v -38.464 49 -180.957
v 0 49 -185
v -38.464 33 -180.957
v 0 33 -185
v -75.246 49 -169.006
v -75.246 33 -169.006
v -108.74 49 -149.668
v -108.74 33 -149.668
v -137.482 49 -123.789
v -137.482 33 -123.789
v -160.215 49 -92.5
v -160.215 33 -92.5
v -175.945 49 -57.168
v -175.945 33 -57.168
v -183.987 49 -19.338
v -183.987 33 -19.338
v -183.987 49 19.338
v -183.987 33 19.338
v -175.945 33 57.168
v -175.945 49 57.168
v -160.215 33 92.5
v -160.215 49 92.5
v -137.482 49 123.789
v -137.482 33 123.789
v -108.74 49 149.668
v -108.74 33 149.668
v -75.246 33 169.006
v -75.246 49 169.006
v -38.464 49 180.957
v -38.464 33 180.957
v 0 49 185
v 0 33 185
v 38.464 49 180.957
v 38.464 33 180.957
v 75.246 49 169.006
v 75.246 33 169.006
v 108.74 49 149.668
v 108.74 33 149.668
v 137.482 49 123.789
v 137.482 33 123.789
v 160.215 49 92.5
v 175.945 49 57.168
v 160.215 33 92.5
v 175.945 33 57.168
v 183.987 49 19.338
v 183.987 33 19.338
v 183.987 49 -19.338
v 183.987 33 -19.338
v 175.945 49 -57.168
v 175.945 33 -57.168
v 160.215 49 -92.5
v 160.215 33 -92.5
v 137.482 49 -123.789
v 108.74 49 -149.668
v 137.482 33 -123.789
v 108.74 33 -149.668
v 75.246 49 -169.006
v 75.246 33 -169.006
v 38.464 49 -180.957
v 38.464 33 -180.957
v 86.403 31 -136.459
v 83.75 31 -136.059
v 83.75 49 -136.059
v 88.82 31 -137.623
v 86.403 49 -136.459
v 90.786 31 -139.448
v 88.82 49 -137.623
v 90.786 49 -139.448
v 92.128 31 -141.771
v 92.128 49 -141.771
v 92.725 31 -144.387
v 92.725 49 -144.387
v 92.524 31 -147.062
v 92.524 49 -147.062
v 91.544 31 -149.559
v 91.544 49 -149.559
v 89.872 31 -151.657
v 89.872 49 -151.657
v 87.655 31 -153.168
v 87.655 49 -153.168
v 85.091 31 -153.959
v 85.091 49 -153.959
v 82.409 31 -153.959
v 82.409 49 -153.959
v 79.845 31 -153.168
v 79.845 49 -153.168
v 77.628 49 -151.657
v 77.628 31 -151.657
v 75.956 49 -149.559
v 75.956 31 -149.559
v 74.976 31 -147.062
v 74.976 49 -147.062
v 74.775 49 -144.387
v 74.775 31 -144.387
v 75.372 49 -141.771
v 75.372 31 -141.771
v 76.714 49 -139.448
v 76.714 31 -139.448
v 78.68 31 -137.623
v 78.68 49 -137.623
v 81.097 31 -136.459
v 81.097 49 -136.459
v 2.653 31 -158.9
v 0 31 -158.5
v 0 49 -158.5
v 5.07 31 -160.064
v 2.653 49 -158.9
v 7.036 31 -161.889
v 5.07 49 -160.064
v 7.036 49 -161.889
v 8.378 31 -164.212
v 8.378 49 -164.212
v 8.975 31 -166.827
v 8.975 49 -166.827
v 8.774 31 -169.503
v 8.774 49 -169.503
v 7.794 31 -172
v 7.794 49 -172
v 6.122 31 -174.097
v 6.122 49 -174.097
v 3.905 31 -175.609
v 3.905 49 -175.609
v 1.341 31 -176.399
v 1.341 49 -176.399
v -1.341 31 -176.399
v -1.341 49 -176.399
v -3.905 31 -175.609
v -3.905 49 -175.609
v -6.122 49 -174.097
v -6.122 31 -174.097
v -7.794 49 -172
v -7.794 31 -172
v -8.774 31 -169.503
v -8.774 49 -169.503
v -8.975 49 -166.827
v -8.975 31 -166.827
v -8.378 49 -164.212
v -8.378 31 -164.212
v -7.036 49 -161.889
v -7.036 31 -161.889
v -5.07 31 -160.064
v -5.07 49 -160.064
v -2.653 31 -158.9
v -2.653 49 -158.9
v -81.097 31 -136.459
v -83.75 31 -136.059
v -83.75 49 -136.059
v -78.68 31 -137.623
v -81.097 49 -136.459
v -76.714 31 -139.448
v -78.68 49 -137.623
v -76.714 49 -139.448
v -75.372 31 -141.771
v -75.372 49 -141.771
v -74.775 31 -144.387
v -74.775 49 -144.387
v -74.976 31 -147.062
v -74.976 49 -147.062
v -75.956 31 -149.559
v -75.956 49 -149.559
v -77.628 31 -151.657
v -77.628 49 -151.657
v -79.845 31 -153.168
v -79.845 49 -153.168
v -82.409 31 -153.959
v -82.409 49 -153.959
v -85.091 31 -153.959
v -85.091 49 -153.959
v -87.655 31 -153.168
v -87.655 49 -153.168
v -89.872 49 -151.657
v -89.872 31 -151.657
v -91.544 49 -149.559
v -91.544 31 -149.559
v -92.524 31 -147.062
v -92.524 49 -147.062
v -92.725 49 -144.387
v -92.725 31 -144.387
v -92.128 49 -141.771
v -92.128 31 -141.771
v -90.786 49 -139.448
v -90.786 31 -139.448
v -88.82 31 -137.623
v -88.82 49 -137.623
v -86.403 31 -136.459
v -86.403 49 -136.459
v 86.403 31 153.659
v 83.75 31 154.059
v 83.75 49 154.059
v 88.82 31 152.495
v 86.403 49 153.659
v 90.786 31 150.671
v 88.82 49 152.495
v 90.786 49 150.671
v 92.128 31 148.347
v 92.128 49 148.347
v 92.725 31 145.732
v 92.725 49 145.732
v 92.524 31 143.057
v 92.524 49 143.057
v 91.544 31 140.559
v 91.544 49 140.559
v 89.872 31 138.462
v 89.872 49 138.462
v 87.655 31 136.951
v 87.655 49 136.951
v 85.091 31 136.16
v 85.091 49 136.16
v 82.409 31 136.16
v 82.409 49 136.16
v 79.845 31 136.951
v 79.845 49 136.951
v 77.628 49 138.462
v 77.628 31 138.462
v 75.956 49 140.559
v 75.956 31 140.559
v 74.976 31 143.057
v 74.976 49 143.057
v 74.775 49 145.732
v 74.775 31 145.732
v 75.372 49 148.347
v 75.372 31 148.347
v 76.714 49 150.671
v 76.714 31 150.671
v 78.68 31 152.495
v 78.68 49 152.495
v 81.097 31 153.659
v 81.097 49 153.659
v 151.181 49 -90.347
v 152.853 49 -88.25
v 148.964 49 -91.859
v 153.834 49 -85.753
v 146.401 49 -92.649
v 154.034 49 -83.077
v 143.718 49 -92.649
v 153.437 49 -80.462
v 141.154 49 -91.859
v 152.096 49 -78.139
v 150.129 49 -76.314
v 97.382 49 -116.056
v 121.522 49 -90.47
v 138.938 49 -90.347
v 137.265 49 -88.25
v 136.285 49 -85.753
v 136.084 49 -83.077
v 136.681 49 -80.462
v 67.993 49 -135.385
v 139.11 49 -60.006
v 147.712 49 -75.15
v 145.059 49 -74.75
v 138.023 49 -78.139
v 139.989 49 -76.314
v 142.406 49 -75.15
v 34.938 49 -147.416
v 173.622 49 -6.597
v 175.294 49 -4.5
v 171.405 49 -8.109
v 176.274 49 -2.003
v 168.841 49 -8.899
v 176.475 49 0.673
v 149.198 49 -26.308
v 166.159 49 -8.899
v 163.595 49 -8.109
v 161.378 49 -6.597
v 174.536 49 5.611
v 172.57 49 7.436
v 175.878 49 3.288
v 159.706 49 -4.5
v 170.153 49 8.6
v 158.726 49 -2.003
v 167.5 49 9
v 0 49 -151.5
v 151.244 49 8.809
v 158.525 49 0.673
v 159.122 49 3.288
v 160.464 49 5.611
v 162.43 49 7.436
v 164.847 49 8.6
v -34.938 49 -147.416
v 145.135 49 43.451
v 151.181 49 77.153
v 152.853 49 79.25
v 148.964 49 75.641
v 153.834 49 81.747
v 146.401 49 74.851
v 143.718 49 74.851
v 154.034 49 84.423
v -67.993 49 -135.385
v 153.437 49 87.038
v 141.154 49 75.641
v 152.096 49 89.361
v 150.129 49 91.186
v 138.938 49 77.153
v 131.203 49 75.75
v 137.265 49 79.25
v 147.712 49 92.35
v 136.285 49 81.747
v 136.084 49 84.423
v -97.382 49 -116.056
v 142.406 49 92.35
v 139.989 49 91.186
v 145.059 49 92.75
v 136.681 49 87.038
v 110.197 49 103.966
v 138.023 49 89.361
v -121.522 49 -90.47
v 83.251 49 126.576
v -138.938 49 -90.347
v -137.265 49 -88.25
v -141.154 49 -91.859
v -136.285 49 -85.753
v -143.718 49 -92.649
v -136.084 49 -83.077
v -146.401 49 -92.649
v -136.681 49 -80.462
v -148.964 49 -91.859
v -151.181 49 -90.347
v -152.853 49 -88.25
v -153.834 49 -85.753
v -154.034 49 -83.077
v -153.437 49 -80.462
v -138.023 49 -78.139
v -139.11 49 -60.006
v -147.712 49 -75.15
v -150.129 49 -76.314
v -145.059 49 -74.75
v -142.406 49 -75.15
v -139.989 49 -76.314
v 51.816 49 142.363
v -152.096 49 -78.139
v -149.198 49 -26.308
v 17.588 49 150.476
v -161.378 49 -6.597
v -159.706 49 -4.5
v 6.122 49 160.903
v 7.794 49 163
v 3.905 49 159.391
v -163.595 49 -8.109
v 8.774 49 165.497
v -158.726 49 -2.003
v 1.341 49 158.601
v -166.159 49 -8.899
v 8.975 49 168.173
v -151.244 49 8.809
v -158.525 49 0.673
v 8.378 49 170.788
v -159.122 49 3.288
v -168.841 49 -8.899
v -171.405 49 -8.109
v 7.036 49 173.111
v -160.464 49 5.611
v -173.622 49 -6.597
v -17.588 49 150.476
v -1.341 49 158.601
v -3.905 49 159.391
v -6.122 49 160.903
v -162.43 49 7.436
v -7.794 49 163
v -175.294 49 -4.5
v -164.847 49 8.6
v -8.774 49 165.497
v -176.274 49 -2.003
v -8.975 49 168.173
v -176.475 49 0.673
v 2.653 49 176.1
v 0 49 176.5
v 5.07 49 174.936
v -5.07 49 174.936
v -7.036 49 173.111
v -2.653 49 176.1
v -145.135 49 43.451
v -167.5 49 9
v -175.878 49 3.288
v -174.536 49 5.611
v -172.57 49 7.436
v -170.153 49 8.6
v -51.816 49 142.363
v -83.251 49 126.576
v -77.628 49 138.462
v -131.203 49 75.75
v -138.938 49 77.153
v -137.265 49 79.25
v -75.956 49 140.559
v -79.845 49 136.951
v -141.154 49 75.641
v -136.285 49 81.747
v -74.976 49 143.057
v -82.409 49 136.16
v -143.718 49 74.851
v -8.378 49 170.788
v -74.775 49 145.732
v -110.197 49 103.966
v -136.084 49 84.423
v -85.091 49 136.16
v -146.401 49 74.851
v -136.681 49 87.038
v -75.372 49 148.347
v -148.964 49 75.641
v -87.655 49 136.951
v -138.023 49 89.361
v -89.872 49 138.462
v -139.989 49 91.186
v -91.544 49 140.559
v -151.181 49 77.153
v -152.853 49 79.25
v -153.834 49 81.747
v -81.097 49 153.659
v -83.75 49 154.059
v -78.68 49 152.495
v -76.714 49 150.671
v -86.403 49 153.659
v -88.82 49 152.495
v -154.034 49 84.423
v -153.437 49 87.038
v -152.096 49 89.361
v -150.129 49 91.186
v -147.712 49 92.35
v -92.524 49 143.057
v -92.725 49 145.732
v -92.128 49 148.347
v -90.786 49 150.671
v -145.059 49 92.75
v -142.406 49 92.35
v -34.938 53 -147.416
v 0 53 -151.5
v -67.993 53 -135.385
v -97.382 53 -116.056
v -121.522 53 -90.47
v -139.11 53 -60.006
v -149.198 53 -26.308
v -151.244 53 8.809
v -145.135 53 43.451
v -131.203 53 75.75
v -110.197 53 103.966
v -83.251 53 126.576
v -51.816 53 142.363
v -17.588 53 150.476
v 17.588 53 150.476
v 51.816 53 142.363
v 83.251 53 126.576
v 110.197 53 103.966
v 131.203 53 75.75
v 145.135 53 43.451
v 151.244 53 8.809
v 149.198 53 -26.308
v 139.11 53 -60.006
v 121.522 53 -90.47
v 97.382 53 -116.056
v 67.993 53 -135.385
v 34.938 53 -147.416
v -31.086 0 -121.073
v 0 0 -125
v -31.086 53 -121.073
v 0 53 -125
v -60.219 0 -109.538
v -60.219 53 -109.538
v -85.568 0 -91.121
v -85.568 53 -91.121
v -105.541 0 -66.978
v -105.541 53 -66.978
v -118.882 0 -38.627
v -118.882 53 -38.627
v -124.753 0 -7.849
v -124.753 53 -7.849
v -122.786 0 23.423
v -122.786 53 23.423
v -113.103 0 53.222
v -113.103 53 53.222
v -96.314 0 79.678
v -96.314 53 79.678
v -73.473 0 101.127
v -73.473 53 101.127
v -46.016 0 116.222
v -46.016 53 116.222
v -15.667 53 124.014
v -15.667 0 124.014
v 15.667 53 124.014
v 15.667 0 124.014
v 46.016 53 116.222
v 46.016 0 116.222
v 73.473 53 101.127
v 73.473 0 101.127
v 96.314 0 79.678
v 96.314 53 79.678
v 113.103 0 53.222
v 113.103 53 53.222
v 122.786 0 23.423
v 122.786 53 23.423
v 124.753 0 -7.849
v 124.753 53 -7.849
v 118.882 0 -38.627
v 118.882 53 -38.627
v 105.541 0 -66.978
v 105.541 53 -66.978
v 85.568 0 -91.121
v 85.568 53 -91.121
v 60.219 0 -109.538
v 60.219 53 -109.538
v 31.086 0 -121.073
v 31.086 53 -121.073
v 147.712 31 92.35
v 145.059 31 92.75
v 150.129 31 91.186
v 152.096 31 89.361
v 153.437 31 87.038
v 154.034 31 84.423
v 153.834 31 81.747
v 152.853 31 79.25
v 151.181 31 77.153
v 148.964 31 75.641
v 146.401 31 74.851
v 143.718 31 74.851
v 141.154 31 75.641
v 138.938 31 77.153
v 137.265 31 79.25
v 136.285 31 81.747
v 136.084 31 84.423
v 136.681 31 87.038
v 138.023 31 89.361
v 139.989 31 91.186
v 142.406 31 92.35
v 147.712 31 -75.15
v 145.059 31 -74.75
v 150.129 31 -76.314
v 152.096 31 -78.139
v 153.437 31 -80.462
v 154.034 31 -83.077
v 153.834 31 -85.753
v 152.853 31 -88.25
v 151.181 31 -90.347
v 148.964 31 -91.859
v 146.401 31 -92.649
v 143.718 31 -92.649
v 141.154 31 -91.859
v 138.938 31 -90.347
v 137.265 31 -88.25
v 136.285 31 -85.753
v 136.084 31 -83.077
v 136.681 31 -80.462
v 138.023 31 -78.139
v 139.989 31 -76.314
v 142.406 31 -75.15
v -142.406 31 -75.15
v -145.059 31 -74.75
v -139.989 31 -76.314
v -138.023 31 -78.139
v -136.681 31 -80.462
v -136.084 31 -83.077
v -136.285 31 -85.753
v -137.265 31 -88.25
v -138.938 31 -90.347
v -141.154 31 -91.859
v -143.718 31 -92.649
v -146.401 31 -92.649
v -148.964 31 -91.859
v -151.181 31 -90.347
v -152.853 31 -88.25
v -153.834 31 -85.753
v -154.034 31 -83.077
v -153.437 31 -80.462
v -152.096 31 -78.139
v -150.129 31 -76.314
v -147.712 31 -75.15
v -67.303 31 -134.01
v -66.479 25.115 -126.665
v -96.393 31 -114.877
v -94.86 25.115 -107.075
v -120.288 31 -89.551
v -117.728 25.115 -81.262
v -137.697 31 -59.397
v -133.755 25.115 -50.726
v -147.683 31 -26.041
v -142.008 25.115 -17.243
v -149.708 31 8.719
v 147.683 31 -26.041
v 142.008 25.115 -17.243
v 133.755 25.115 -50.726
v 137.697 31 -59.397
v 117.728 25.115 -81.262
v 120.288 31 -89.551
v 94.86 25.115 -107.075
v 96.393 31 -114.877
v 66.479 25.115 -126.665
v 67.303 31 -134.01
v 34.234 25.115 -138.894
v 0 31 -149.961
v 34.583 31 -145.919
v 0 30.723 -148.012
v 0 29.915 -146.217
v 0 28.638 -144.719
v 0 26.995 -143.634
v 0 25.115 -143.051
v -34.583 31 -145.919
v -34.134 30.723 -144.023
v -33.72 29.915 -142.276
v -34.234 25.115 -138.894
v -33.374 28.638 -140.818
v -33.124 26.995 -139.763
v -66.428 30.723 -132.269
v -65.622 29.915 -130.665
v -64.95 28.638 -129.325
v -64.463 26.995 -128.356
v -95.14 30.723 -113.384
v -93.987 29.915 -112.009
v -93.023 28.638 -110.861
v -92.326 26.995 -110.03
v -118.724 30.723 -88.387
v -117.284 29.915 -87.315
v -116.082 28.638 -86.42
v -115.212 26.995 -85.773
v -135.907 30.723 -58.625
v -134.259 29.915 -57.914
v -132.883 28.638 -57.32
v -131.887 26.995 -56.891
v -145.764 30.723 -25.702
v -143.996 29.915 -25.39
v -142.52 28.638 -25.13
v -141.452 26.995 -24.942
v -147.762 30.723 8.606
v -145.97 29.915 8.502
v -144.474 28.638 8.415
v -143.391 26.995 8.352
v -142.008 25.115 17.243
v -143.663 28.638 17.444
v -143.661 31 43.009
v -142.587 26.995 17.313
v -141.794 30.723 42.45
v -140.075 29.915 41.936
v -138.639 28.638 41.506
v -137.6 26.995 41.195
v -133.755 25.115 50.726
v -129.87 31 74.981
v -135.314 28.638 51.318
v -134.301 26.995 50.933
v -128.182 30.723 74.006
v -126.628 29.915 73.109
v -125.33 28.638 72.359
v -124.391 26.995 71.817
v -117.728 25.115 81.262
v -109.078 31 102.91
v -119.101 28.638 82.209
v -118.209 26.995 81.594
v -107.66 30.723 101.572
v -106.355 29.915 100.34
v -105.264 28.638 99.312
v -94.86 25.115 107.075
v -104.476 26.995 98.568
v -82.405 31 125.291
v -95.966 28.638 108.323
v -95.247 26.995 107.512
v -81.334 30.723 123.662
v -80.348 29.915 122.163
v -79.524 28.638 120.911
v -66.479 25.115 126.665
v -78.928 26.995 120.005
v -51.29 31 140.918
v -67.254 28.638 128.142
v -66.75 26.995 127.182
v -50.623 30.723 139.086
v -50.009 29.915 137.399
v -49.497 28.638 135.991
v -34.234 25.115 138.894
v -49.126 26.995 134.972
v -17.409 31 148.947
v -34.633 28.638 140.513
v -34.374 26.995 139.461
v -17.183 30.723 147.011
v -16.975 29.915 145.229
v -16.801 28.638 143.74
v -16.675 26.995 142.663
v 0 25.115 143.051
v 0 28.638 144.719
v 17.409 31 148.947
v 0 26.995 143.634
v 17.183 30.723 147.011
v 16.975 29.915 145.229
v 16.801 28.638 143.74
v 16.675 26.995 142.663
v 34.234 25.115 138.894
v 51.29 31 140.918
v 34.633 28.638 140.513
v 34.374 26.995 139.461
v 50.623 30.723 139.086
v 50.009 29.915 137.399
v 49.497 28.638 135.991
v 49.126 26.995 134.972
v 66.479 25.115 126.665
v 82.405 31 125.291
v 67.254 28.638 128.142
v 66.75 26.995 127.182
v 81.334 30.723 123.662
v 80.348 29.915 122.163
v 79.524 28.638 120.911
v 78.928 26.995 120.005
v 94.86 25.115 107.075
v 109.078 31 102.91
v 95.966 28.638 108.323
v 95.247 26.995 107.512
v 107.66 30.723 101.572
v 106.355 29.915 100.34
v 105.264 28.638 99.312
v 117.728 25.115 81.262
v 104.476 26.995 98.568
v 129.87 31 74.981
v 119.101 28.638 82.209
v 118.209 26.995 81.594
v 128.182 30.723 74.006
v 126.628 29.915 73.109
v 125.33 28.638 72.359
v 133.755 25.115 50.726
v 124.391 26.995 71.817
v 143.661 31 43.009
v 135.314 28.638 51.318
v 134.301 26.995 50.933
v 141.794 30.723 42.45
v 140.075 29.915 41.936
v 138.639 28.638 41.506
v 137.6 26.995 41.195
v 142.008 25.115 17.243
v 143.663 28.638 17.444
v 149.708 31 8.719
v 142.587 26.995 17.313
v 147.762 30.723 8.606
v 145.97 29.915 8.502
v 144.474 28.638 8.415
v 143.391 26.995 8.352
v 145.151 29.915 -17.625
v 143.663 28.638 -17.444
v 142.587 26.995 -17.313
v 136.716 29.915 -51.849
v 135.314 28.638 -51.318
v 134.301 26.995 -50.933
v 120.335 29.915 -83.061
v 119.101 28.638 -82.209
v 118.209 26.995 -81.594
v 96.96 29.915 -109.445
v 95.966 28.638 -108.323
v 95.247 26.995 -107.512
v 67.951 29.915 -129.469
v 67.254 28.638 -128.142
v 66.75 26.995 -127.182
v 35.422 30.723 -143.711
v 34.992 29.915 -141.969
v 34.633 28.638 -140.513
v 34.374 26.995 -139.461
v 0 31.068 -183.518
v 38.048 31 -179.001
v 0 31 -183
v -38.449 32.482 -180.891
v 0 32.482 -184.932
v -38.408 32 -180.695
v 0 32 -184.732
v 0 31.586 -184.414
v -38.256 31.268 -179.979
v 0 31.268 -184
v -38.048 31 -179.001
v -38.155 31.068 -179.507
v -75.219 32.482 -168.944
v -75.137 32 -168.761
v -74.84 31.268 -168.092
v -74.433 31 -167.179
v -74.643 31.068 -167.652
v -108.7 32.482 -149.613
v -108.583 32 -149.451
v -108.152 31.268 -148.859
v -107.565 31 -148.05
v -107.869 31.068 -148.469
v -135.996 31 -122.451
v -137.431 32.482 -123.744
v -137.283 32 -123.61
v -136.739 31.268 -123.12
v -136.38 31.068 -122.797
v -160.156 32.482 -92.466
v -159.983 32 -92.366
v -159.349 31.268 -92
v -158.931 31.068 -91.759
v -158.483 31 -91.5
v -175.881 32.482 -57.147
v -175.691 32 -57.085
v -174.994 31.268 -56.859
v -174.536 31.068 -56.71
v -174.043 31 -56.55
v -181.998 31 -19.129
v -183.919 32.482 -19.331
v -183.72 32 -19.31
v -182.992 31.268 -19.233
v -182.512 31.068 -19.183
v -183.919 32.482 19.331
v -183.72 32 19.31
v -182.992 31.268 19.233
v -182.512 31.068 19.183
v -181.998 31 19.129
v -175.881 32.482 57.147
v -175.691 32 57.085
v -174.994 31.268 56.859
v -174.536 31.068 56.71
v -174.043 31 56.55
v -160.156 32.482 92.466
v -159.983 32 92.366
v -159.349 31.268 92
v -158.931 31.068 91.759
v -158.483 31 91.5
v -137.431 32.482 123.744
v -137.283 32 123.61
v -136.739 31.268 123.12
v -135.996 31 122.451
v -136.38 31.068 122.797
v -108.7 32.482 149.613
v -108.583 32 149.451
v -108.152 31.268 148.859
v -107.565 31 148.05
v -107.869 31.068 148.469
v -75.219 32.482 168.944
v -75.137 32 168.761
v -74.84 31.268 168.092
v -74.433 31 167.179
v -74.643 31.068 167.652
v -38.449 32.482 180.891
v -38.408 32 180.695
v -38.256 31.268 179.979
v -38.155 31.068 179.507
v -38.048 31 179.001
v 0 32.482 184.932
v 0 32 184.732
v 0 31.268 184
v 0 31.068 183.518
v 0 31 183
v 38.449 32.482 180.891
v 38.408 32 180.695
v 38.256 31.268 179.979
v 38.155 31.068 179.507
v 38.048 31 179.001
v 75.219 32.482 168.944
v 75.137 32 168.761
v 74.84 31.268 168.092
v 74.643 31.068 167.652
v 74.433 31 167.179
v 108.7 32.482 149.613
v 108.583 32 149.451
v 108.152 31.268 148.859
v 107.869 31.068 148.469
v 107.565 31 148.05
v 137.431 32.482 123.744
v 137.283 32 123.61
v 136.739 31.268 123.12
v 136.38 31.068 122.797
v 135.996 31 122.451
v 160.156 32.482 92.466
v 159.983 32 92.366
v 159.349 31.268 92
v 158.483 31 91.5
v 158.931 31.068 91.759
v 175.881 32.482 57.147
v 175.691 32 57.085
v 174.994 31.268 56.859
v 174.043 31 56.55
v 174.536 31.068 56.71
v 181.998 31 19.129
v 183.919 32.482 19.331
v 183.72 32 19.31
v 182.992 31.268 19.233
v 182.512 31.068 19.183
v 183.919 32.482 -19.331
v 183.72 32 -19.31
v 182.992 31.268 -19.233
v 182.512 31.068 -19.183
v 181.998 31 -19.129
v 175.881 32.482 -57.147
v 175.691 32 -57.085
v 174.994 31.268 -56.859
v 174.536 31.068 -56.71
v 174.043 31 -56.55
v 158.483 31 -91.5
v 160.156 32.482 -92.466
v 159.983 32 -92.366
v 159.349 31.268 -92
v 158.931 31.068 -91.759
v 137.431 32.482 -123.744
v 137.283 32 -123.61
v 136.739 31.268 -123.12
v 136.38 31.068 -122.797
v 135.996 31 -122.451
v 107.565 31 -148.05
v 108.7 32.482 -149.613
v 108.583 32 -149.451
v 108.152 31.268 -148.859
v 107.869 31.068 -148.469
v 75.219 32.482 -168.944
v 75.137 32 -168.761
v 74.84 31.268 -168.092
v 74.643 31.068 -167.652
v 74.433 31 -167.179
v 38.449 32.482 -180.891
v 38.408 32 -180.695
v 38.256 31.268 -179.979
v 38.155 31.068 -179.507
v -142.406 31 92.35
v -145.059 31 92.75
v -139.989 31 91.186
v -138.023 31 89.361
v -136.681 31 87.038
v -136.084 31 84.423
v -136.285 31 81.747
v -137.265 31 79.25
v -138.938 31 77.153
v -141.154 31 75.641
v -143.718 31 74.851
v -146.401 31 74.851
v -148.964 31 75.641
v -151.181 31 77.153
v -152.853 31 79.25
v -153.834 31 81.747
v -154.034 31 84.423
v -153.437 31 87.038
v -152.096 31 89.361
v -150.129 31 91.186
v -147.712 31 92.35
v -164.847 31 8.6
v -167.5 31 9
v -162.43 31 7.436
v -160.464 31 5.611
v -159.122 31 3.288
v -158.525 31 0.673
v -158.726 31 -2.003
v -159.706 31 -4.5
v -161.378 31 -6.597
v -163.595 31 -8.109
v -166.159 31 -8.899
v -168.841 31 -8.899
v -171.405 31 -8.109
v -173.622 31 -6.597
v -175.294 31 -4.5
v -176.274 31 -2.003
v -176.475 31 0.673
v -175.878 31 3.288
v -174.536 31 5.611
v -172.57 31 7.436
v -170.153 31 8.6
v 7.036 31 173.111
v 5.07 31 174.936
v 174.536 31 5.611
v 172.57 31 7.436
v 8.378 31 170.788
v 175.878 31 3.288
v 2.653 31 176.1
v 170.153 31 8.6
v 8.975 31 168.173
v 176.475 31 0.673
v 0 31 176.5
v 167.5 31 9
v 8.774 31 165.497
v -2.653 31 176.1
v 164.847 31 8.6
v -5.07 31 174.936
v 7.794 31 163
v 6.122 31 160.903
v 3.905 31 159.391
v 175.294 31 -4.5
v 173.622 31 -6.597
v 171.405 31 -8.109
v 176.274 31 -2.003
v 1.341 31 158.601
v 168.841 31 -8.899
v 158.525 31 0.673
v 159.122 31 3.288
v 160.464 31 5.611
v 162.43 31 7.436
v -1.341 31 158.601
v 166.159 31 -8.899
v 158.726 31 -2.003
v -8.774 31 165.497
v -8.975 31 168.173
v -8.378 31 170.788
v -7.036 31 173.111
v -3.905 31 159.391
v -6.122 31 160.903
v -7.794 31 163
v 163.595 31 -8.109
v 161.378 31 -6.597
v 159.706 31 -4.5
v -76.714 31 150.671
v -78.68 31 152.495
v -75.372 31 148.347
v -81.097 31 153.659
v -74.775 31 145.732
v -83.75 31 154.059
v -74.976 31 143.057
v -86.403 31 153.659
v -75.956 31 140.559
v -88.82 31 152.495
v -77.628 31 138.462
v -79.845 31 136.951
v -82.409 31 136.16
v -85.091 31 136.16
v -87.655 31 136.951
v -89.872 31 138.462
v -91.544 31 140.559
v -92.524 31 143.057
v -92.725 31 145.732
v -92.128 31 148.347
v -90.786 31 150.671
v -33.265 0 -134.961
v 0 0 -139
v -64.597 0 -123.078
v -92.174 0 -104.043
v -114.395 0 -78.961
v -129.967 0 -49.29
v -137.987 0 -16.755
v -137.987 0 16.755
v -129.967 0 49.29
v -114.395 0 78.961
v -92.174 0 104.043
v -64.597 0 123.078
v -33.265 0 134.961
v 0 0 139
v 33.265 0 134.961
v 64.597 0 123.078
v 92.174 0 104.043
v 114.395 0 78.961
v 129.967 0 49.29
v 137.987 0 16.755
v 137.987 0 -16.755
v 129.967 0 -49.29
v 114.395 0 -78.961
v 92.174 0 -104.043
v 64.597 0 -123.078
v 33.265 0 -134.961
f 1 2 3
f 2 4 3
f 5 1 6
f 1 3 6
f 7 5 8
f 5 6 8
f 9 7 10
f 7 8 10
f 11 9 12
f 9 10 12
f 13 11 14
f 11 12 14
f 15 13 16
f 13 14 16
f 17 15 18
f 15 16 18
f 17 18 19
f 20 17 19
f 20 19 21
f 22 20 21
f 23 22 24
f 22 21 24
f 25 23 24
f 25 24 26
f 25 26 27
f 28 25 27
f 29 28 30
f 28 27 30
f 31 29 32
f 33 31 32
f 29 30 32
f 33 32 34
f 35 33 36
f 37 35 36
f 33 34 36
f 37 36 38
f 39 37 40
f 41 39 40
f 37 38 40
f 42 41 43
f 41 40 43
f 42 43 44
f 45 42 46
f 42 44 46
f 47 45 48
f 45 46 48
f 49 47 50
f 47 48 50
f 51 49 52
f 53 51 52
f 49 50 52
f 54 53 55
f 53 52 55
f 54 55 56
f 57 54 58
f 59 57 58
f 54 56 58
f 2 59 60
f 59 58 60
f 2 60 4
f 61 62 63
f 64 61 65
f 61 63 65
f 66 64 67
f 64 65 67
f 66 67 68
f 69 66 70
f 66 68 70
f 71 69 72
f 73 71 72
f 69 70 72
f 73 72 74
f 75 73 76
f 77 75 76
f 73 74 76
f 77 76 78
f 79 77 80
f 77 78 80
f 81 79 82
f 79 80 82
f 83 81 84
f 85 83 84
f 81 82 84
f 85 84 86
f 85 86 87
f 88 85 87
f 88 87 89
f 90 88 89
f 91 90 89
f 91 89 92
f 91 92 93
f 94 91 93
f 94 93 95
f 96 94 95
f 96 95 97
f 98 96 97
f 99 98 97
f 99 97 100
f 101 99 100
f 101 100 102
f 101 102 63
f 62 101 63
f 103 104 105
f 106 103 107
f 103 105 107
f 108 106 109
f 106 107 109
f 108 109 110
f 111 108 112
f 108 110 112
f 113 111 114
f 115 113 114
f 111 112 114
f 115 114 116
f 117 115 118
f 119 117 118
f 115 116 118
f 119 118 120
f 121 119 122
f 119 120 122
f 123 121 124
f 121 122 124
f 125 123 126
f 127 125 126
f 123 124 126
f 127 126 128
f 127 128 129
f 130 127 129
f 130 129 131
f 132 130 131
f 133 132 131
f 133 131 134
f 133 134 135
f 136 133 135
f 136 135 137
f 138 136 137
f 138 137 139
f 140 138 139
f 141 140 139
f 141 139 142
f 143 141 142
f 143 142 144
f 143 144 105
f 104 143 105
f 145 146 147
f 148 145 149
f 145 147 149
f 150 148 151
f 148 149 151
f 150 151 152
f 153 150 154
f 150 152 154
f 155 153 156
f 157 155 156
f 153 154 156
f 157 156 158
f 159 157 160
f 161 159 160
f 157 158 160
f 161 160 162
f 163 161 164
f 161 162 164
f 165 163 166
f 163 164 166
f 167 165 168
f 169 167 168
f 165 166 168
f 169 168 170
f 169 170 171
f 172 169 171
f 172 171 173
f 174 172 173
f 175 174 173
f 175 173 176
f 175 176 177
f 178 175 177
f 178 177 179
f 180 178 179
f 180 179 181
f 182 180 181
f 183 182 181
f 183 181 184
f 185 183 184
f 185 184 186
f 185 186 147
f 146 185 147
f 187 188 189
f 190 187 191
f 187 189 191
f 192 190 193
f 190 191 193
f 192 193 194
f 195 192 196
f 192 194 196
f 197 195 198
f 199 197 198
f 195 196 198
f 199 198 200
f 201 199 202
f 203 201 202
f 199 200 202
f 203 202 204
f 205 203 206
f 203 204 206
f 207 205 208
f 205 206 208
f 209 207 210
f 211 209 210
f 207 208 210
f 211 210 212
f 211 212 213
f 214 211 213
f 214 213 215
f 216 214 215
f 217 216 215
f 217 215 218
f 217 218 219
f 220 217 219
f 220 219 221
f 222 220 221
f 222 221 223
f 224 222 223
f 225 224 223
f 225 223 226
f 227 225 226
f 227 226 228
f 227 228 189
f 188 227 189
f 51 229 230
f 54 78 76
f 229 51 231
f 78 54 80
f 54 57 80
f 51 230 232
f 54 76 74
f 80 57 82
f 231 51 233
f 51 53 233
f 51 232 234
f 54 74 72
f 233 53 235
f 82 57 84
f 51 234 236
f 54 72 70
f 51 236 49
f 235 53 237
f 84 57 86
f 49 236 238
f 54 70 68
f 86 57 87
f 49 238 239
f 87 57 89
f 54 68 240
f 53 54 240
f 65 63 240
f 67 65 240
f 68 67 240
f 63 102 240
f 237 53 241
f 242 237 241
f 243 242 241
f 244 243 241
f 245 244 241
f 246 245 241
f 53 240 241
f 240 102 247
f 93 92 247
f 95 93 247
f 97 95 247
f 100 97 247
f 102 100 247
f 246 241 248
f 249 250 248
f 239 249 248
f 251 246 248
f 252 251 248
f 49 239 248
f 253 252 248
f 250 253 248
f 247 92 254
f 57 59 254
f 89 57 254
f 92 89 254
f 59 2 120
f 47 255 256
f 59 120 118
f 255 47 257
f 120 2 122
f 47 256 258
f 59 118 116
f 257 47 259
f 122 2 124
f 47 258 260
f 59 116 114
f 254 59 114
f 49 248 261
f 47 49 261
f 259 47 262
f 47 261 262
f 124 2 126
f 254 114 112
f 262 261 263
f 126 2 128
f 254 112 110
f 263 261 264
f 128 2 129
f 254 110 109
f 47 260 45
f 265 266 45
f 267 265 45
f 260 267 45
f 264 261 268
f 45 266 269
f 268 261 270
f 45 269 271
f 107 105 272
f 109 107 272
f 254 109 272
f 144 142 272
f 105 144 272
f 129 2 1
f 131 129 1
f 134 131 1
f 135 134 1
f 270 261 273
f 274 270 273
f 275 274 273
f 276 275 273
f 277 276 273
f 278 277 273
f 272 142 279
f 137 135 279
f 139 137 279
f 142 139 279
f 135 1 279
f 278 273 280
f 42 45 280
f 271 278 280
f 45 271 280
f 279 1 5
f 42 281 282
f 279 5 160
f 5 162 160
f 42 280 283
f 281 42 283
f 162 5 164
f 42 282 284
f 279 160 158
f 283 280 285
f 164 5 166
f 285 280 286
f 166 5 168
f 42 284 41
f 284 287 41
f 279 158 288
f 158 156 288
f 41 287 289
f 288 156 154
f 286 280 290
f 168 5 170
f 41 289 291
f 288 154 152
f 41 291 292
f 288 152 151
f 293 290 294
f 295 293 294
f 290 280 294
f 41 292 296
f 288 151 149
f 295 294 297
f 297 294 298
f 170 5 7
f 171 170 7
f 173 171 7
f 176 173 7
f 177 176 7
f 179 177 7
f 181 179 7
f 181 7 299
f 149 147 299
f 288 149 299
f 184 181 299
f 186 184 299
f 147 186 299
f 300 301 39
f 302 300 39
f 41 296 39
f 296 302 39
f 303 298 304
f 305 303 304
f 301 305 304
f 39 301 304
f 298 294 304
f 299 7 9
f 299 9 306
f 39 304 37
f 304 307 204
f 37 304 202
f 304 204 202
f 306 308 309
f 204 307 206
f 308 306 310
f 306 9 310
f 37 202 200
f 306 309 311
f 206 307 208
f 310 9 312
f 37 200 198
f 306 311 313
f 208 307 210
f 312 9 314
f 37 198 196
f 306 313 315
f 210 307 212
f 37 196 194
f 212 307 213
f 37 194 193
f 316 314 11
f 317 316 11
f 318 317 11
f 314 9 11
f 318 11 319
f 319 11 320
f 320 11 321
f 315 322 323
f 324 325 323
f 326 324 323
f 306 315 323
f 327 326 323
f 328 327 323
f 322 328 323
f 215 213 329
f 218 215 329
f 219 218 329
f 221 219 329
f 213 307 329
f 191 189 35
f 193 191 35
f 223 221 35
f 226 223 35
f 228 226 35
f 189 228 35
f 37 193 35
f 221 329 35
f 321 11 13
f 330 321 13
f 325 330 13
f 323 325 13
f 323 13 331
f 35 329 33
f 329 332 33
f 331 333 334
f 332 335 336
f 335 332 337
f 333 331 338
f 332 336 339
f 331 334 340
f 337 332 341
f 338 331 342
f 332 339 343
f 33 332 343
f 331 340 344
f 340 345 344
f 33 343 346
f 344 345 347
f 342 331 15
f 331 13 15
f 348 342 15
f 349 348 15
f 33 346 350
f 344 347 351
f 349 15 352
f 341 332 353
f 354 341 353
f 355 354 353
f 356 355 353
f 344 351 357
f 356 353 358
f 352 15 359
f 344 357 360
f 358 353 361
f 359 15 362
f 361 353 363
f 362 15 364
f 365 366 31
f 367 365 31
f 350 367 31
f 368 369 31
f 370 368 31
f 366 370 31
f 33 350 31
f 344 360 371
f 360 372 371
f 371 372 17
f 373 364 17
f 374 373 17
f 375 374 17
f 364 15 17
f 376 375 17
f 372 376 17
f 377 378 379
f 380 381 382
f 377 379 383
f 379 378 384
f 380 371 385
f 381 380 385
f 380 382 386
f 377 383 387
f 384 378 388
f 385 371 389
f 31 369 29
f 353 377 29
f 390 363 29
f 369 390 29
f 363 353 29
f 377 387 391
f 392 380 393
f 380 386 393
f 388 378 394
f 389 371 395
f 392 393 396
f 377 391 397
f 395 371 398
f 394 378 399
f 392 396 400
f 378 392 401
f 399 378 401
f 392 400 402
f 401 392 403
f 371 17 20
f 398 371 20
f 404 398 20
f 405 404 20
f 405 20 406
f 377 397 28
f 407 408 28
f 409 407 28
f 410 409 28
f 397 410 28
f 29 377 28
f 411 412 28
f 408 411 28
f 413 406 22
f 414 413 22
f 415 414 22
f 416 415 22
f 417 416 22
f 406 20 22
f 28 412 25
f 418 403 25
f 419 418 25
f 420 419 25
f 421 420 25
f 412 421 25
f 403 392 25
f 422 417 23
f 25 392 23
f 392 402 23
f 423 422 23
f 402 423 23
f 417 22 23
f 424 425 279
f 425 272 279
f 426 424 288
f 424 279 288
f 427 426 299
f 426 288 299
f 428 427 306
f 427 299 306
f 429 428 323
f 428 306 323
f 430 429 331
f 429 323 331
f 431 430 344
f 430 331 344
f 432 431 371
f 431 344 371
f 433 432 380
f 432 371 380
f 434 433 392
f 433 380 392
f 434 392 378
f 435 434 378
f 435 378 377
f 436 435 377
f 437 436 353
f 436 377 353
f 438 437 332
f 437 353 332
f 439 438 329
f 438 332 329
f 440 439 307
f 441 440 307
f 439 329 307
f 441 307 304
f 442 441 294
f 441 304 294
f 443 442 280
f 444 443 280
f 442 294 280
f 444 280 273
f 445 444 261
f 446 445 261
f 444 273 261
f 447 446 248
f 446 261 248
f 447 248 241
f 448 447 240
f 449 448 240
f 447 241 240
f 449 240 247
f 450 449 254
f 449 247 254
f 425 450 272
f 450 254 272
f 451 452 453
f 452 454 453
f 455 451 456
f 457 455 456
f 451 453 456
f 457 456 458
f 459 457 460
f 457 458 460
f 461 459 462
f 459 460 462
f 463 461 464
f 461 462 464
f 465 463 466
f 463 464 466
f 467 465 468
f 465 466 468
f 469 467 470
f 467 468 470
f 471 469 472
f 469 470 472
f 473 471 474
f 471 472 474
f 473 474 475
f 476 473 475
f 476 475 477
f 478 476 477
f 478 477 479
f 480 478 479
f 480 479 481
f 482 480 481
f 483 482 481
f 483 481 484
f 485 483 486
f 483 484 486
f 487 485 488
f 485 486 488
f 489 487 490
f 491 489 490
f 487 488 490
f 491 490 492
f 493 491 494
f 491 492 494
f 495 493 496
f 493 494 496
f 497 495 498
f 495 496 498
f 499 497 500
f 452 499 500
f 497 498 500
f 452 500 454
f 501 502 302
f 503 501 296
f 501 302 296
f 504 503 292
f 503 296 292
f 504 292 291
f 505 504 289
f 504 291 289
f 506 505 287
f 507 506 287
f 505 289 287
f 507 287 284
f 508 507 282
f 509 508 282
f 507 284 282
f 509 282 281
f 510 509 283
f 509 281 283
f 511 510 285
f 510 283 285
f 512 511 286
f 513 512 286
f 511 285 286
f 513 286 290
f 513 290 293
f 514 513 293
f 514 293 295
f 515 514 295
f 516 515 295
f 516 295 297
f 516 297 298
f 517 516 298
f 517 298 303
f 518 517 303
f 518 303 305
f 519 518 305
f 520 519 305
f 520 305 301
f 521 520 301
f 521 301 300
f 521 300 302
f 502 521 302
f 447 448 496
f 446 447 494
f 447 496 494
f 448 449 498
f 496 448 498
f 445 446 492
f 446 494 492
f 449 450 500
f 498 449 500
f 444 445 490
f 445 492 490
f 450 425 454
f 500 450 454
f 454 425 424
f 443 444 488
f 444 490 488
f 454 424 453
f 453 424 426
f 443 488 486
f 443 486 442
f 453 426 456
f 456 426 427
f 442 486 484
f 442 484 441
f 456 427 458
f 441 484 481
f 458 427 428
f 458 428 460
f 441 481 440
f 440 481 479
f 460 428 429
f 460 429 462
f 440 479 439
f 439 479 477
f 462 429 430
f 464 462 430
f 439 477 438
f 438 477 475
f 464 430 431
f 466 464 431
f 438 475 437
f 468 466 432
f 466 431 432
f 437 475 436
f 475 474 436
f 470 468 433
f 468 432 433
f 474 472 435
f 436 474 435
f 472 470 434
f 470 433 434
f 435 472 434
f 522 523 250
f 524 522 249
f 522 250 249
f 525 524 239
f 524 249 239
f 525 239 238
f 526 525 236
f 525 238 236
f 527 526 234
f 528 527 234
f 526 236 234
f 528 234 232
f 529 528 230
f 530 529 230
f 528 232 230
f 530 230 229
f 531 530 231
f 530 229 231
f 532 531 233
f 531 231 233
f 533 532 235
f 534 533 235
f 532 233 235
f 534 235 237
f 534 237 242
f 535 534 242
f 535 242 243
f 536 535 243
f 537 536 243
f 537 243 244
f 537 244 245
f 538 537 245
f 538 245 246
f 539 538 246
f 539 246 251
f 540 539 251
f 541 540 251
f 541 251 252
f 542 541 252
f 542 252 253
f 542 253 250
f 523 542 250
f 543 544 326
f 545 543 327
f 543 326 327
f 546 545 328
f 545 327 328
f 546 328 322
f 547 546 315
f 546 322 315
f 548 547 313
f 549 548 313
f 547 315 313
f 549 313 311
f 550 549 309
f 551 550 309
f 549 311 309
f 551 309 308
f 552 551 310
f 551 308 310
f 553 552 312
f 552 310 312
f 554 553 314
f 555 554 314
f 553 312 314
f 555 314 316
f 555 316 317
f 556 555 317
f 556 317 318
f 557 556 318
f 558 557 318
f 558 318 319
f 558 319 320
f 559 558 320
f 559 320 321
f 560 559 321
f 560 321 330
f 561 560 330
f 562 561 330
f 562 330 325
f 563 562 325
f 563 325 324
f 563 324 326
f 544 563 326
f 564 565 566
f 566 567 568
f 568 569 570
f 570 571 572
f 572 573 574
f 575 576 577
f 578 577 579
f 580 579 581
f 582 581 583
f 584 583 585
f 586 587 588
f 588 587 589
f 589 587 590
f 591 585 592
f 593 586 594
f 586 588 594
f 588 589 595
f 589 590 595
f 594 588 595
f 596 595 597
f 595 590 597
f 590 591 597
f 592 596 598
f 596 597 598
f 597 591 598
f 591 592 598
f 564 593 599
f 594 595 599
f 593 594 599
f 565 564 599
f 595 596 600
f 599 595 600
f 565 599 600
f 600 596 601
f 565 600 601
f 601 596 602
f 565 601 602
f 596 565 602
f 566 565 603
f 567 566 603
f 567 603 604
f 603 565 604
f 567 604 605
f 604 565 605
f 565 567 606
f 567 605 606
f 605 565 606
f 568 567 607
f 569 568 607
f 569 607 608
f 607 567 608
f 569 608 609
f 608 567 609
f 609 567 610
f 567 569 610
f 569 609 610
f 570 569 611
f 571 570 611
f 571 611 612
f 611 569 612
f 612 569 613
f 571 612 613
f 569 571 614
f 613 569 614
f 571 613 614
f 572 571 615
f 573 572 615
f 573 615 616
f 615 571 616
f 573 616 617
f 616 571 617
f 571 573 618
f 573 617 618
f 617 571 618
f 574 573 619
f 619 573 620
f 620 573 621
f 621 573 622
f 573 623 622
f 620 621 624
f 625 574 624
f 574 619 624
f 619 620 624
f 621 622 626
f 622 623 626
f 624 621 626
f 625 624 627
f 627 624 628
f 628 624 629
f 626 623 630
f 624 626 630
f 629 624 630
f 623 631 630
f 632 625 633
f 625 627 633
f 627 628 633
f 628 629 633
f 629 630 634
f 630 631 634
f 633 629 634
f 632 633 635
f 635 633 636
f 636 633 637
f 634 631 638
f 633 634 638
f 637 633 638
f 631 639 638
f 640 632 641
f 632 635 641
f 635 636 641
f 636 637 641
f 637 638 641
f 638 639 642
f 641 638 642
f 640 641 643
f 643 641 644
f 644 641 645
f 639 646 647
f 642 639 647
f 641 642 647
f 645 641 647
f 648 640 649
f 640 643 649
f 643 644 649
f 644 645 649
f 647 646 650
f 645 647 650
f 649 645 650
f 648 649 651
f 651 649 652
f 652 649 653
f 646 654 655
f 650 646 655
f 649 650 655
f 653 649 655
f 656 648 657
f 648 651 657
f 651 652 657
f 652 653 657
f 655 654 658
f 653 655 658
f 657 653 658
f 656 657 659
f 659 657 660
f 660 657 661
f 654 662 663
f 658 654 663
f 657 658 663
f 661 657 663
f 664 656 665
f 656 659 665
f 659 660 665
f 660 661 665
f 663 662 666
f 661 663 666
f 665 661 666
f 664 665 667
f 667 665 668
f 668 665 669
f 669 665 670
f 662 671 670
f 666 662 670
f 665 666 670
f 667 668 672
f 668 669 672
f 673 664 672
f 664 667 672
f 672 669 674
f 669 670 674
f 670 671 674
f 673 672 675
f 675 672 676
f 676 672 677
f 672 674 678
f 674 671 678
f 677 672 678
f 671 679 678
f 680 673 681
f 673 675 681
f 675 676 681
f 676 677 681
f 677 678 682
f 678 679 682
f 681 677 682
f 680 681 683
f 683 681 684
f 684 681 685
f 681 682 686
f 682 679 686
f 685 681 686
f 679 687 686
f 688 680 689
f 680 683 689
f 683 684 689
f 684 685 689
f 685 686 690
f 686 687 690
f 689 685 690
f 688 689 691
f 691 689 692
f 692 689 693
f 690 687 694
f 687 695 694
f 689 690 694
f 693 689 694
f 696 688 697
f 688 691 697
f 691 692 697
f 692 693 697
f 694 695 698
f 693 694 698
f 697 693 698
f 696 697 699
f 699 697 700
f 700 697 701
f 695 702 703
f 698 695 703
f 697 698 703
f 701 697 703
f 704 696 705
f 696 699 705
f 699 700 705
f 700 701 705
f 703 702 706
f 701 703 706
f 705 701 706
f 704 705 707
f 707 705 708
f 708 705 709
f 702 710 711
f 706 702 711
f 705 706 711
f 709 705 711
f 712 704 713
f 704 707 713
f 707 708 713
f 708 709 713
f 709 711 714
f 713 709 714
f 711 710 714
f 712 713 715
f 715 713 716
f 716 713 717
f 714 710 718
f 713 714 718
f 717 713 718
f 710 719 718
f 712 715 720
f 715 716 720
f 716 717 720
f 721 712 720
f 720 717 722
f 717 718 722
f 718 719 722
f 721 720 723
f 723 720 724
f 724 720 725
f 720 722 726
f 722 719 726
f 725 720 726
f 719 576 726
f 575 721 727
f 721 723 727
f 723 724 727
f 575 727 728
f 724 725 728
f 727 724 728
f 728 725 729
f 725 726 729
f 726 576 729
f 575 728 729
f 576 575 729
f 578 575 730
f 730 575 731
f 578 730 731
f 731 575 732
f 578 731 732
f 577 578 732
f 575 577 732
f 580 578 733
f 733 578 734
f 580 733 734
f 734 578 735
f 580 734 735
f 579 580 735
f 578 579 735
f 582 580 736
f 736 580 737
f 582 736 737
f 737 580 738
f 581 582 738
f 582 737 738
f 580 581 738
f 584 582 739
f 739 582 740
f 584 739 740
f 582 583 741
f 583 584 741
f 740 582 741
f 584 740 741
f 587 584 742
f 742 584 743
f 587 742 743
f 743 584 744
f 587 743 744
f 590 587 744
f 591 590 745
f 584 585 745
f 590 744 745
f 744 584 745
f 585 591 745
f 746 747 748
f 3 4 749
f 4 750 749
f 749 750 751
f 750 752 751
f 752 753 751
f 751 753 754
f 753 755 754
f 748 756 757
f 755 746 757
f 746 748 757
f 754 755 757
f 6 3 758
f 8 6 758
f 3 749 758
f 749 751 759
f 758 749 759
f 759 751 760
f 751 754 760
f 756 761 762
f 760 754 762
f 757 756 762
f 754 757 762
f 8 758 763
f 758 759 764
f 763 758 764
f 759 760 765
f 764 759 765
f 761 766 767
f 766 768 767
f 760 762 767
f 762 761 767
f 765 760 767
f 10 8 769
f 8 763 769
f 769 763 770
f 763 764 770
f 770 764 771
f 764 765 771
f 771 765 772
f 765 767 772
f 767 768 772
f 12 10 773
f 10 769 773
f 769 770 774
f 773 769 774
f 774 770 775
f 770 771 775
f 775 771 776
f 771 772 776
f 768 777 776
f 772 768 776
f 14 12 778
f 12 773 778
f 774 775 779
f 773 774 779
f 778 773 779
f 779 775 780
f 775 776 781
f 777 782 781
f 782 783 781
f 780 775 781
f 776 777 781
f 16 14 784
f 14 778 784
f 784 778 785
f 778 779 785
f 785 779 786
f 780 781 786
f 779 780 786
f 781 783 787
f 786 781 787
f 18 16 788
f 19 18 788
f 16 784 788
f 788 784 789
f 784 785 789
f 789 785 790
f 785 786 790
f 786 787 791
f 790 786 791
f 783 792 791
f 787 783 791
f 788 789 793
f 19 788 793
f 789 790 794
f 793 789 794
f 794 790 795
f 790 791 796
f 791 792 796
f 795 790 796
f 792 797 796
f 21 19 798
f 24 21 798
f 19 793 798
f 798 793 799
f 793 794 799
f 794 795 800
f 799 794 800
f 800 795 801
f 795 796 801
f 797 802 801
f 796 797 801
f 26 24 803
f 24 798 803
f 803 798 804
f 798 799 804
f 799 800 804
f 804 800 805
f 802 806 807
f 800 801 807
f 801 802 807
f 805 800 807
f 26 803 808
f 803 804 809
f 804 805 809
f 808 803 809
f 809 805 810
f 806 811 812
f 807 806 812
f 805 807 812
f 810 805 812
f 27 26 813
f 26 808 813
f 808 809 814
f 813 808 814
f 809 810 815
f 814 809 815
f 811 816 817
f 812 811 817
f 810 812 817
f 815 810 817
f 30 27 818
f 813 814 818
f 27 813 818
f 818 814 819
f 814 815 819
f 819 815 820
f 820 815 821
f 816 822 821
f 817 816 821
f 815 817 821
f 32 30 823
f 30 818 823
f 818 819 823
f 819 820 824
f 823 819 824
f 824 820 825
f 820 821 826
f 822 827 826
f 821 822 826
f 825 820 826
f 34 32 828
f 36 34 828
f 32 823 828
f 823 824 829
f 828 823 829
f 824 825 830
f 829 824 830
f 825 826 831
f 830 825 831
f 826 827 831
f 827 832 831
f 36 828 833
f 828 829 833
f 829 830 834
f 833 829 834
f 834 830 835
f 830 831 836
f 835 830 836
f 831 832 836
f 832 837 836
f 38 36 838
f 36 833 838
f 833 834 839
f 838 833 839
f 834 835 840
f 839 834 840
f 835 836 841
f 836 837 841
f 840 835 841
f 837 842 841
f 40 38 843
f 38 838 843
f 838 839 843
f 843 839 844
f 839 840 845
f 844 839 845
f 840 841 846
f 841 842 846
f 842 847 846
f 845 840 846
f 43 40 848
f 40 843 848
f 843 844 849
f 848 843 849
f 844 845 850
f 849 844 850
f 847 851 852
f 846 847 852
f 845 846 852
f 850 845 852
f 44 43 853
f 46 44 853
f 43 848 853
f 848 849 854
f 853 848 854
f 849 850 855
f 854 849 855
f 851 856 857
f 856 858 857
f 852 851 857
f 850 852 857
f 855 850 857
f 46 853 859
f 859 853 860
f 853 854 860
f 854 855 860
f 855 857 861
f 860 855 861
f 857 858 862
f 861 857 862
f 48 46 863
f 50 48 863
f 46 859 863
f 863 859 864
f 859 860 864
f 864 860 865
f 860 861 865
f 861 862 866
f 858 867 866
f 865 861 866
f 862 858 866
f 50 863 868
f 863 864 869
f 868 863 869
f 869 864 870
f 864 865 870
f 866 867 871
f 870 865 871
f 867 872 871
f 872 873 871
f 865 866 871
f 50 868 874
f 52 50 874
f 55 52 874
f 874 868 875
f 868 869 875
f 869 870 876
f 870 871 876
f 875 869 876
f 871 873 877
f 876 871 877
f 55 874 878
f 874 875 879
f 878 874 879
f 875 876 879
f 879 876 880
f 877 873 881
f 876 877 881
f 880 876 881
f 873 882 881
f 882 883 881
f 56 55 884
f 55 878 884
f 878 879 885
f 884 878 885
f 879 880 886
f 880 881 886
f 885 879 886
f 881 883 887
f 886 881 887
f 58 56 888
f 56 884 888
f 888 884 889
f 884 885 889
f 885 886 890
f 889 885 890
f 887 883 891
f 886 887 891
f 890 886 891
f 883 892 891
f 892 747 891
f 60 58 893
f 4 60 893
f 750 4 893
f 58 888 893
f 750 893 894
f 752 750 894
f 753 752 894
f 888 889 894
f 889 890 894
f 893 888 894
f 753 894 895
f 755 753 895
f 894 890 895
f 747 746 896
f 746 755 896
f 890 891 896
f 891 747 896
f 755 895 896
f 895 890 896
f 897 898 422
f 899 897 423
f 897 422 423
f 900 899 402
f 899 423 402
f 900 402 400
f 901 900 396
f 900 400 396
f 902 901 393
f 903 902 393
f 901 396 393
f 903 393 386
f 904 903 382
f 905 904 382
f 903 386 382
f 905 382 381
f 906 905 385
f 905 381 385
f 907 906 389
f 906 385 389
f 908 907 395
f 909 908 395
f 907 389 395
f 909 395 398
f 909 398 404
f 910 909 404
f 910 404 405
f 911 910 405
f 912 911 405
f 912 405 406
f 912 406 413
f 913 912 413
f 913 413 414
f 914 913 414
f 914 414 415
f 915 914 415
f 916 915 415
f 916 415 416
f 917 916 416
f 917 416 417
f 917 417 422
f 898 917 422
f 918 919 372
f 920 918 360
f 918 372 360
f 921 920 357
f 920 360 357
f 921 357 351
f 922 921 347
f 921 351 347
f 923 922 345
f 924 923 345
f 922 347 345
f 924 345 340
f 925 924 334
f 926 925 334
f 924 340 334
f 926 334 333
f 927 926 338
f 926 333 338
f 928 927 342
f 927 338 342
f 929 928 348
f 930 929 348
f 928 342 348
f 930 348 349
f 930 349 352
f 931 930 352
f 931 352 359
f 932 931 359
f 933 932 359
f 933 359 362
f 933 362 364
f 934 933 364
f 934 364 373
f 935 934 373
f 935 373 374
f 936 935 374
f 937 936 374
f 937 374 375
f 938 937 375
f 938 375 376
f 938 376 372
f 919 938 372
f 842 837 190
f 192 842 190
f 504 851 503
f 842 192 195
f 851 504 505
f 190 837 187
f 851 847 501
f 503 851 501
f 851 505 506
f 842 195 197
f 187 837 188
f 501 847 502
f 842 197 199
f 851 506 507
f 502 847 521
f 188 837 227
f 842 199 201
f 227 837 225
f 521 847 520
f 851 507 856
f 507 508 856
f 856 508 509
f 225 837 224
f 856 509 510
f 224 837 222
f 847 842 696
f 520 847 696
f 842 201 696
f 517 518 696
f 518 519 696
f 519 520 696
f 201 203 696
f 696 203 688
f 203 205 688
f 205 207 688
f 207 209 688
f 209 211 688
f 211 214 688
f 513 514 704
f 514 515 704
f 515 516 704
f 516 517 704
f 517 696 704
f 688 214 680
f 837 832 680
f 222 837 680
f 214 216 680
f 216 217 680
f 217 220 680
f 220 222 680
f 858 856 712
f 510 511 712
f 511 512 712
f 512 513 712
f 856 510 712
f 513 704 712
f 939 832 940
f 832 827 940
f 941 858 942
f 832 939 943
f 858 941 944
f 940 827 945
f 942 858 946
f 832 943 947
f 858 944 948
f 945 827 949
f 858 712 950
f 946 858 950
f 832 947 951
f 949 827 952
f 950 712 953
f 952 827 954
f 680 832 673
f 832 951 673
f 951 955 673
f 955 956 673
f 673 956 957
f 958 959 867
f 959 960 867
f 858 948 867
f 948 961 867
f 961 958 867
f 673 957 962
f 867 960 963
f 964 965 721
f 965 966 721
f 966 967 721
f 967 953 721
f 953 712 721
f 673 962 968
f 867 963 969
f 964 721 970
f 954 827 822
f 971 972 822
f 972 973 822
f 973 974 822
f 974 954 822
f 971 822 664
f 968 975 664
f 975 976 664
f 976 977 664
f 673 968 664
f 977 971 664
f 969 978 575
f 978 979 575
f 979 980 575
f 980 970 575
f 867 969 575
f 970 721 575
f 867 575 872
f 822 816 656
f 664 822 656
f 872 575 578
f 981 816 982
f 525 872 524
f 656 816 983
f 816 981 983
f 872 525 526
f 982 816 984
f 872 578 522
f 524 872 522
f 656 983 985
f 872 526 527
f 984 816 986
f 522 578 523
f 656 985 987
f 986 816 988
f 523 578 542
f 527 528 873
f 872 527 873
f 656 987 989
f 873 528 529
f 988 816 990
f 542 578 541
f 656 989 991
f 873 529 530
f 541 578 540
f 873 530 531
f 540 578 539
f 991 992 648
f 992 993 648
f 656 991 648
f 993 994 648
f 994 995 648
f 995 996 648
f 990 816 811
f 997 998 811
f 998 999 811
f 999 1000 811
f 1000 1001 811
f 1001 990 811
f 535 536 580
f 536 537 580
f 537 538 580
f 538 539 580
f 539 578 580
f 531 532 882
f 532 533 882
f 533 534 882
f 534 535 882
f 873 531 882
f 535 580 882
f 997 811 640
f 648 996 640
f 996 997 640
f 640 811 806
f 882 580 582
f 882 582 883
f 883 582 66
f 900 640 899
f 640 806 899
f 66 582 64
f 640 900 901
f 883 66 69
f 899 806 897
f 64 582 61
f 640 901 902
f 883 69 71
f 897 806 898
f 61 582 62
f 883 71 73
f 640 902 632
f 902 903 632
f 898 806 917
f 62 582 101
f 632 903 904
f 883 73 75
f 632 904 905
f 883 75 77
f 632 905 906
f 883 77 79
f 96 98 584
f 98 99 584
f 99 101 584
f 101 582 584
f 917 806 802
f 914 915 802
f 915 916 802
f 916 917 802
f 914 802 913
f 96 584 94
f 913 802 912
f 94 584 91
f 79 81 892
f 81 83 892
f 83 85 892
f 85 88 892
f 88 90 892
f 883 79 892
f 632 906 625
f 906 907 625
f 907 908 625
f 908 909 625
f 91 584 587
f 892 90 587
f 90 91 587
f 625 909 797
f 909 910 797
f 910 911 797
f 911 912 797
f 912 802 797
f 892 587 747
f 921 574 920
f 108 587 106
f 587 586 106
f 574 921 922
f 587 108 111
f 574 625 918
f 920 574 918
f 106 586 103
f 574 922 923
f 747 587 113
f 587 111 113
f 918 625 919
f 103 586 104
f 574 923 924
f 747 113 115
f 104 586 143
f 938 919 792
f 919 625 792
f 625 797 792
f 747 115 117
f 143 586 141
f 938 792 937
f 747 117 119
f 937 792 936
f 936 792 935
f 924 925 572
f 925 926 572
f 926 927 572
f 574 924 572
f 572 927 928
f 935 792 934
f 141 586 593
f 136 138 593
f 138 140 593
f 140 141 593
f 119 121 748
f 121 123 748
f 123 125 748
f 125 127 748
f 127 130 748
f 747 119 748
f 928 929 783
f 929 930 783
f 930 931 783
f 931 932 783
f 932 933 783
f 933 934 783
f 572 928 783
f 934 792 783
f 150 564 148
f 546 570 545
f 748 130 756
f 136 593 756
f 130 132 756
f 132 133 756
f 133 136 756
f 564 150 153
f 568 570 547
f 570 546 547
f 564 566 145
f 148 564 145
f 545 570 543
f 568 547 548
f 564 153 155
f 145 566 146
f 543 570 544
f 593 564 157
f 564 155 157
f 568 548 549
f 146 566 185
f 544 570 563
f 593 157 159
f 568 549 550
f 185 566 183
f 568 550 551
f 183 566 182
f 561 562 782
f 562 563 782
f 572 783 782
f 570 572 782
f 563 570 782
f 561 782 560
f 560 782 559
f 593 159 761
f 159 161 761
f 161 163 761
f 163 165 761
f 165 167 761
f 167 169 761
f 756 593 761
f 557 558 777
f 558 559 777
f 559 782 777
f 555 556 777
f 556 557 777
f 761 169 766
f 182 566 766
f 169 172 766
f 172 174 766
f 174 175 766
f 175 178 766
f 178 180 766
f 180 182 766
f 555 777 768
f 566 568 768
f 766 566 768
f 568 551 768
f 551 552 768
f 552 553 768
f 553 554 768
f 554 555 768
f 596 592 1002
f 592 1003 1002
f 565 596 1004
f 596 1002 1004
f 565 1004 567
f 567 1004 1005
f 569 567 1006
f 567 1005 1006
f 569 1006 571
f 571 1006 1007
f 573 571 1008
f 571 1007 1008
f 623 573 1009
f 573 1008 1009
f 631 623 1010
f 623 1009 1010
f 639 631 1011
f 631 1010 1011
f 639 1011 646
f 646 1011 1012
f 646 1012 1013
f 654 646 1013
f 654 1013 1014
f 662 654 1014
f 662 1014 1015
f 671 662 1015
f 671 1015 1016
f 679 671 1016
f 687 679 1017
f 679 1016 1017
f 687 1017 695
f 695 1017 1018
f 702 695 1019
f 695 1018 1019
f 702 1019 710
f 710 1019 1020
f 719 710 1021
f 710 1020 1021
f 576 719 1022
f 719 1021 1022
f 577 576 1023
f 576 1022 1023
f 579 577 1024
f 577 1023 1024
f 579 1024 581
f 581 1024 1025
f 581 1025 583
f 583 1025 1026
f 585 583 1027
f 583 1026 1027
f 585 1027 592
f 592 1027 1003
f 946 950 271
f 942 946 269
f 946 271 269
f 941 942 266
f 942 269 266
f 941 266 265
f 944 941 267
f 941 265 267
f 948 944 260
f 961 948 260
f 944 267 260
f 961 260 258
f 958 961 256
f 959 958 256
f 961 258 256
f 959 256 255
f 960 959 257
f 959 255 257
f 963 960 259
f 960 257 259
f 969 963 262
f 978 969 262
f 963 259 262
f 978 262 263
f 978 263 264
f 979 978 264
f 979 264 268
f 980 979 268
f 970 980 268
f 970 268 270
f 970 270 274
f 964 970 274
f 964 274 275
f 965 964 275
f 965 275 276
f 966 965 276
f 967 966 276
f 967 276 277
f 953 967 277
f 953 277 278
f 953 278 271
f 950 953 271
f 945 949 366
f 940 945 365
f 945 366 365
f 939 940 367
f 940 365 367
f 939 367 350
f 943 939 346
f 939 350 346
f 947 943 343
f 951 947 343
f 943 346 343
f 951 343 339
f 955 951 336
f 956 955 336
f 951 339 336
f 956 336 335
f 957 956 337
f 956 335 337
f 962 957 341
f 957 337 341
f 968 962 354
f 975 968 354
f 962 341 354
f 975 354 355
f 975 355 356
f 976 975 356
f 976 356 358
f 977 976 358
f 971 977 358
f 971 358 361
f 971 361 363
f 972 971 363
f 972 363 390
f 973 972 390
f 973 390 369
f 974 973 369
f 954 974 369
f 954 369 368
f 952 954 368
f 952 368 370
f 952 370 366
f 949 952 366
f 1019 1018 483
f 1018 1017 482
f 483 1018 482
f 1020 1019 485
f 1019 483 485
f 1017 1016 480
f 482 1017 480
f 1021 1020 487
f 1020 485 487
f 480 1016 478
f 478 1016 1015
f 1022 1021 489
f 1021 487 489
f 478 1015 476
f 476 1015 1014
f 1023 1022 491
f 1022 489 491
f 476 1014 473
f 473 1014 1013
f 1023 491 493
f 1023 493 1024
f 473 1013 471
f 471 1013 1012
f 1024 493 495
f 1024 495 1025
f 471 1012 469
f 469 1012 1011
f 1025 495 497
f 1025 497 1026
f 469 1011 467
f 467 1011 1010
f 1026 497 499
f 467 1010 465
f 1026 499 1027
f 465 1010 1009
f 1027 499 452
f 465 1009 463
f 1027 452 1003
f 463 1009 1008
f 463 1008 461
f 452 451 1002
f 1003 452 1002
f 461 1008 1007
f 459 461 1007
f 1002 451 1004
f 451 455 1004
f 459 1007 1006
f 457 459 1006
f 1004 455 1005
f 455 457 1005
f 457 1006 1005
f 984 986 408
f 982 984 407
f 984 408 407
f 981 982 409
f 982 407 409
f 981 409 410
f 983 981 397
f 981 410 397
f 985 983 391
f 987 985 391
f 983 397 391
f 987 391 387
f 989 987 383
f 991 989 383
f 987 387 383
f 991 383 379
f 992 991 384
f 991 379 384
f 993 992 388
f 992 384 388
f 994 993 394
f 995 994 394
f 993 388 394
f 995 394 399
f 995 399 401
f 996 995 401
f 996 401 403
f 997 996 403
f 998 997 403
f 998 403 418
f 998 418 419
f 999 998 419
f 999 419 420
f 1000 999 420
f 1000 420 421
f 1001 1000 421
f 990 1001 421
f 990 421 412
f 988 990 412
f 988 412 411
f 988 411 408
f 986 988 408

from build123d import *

# Parameters (mm, degrees)
SKETCH_2_R          = 9
CUT_EXTRUDE_1_DEPTH = 267.178511668


with BuildPart() as part:
    # Эскиз1 → Повернуть1 (revolve)
    with BuildSketch(Plane.XY, mode=Mode.PRIVATE) as revolve_1_sk:
        with BuildLine():
            Line((-125, 0), (-125, 53))
            Line((-125, 53), (-151.5, 53))
            Line((-151.5, 53), (-151.5, 49))
            Line((-151.5, 49), (-185, 49))
            Line((-185, 49), (-185, 33))
            ThreePointArc((-185, 33), (-184.414213562, 31.585786438), (-183, 31))
            Line((-183, 31), (-149.961434147, 31))
            ThreePointArc((-149.961434147, 31), (-145.422843479, 29.329277132), (-143.050746302, 25.114627072))
            Line((-143.050746302, 25.114627072), (-139, 0))
            Line((-139, 0), (-125, 0))
        make_face()
    revolve(revolve_1_sk.sketch.rotate(Axis((0, 0, 0), (0, 1, 0)), 270), axis=Axis((0, 0, 0), (0, 1, 0)))

    # Эскиз2 → Вырез-Вытянуть1 (cut, through all)
    with BuildSketch(Plane(origin=(0, 49, 0), x_dir=(1, 0, 0), z_dir=(0, 1, 0))):
        with Locations(Location((-167.5, 0, 0), (0, 0, 270))):
            Circle(SKETCH_2_R)
        with Locations(Location((-145.059255134, 83.75, 0), (0, 0, 270))):
            Circle(SKETCH_2_R)
        with Locations(Location((-83.75, 145.059255134, 0), (0, 0, 270))):
            Circle(SKETCH_2_R)
        with Locations(Location((0, 167.5, 0), (0, 0, 270))):
            Circle(SKETCH_2_R)
        with Locations(Location((83.75, 145.059255134, 0), (0, 0, 270))):
            Circle(SKETCH_2_R)
        with Locations(Location((145.059255134, 83.75, 0), (0, 0, 270))):
            Circle(SKETCH_2_R)
        with Locations(Location((167.5, 0, 0), (0, 0, 270))):
            Circle(SKETCH_2_R)
        with Locations(Location((145.059255134, -83.75, 0), (0, 0, 270))):
            Circle(SKETCH_2_R)
        with Locations(Location((83.75, -145.059255134, 0), (0, 0, 270))):
            Circle(SKETCH_2_R)
        with Locations(Location((0, -167.5, 0), (0, 0, 270))):
            Circle(SKETCH_2_R)
        with Locations(Location((-83.75, -145.059255134, 0), (0, 0, 270))):
            Circle(SKETCH_2_R)
        with Locations(Location((-145.059255134, -83.75, 0), (0, 0, 270))):
            Circle(SKETCH_2_R)
    extrude(amount=-CUT_EXTRUDE_1_DEPTH, mode=Mode.SUBTRACT)


solid = part.part
